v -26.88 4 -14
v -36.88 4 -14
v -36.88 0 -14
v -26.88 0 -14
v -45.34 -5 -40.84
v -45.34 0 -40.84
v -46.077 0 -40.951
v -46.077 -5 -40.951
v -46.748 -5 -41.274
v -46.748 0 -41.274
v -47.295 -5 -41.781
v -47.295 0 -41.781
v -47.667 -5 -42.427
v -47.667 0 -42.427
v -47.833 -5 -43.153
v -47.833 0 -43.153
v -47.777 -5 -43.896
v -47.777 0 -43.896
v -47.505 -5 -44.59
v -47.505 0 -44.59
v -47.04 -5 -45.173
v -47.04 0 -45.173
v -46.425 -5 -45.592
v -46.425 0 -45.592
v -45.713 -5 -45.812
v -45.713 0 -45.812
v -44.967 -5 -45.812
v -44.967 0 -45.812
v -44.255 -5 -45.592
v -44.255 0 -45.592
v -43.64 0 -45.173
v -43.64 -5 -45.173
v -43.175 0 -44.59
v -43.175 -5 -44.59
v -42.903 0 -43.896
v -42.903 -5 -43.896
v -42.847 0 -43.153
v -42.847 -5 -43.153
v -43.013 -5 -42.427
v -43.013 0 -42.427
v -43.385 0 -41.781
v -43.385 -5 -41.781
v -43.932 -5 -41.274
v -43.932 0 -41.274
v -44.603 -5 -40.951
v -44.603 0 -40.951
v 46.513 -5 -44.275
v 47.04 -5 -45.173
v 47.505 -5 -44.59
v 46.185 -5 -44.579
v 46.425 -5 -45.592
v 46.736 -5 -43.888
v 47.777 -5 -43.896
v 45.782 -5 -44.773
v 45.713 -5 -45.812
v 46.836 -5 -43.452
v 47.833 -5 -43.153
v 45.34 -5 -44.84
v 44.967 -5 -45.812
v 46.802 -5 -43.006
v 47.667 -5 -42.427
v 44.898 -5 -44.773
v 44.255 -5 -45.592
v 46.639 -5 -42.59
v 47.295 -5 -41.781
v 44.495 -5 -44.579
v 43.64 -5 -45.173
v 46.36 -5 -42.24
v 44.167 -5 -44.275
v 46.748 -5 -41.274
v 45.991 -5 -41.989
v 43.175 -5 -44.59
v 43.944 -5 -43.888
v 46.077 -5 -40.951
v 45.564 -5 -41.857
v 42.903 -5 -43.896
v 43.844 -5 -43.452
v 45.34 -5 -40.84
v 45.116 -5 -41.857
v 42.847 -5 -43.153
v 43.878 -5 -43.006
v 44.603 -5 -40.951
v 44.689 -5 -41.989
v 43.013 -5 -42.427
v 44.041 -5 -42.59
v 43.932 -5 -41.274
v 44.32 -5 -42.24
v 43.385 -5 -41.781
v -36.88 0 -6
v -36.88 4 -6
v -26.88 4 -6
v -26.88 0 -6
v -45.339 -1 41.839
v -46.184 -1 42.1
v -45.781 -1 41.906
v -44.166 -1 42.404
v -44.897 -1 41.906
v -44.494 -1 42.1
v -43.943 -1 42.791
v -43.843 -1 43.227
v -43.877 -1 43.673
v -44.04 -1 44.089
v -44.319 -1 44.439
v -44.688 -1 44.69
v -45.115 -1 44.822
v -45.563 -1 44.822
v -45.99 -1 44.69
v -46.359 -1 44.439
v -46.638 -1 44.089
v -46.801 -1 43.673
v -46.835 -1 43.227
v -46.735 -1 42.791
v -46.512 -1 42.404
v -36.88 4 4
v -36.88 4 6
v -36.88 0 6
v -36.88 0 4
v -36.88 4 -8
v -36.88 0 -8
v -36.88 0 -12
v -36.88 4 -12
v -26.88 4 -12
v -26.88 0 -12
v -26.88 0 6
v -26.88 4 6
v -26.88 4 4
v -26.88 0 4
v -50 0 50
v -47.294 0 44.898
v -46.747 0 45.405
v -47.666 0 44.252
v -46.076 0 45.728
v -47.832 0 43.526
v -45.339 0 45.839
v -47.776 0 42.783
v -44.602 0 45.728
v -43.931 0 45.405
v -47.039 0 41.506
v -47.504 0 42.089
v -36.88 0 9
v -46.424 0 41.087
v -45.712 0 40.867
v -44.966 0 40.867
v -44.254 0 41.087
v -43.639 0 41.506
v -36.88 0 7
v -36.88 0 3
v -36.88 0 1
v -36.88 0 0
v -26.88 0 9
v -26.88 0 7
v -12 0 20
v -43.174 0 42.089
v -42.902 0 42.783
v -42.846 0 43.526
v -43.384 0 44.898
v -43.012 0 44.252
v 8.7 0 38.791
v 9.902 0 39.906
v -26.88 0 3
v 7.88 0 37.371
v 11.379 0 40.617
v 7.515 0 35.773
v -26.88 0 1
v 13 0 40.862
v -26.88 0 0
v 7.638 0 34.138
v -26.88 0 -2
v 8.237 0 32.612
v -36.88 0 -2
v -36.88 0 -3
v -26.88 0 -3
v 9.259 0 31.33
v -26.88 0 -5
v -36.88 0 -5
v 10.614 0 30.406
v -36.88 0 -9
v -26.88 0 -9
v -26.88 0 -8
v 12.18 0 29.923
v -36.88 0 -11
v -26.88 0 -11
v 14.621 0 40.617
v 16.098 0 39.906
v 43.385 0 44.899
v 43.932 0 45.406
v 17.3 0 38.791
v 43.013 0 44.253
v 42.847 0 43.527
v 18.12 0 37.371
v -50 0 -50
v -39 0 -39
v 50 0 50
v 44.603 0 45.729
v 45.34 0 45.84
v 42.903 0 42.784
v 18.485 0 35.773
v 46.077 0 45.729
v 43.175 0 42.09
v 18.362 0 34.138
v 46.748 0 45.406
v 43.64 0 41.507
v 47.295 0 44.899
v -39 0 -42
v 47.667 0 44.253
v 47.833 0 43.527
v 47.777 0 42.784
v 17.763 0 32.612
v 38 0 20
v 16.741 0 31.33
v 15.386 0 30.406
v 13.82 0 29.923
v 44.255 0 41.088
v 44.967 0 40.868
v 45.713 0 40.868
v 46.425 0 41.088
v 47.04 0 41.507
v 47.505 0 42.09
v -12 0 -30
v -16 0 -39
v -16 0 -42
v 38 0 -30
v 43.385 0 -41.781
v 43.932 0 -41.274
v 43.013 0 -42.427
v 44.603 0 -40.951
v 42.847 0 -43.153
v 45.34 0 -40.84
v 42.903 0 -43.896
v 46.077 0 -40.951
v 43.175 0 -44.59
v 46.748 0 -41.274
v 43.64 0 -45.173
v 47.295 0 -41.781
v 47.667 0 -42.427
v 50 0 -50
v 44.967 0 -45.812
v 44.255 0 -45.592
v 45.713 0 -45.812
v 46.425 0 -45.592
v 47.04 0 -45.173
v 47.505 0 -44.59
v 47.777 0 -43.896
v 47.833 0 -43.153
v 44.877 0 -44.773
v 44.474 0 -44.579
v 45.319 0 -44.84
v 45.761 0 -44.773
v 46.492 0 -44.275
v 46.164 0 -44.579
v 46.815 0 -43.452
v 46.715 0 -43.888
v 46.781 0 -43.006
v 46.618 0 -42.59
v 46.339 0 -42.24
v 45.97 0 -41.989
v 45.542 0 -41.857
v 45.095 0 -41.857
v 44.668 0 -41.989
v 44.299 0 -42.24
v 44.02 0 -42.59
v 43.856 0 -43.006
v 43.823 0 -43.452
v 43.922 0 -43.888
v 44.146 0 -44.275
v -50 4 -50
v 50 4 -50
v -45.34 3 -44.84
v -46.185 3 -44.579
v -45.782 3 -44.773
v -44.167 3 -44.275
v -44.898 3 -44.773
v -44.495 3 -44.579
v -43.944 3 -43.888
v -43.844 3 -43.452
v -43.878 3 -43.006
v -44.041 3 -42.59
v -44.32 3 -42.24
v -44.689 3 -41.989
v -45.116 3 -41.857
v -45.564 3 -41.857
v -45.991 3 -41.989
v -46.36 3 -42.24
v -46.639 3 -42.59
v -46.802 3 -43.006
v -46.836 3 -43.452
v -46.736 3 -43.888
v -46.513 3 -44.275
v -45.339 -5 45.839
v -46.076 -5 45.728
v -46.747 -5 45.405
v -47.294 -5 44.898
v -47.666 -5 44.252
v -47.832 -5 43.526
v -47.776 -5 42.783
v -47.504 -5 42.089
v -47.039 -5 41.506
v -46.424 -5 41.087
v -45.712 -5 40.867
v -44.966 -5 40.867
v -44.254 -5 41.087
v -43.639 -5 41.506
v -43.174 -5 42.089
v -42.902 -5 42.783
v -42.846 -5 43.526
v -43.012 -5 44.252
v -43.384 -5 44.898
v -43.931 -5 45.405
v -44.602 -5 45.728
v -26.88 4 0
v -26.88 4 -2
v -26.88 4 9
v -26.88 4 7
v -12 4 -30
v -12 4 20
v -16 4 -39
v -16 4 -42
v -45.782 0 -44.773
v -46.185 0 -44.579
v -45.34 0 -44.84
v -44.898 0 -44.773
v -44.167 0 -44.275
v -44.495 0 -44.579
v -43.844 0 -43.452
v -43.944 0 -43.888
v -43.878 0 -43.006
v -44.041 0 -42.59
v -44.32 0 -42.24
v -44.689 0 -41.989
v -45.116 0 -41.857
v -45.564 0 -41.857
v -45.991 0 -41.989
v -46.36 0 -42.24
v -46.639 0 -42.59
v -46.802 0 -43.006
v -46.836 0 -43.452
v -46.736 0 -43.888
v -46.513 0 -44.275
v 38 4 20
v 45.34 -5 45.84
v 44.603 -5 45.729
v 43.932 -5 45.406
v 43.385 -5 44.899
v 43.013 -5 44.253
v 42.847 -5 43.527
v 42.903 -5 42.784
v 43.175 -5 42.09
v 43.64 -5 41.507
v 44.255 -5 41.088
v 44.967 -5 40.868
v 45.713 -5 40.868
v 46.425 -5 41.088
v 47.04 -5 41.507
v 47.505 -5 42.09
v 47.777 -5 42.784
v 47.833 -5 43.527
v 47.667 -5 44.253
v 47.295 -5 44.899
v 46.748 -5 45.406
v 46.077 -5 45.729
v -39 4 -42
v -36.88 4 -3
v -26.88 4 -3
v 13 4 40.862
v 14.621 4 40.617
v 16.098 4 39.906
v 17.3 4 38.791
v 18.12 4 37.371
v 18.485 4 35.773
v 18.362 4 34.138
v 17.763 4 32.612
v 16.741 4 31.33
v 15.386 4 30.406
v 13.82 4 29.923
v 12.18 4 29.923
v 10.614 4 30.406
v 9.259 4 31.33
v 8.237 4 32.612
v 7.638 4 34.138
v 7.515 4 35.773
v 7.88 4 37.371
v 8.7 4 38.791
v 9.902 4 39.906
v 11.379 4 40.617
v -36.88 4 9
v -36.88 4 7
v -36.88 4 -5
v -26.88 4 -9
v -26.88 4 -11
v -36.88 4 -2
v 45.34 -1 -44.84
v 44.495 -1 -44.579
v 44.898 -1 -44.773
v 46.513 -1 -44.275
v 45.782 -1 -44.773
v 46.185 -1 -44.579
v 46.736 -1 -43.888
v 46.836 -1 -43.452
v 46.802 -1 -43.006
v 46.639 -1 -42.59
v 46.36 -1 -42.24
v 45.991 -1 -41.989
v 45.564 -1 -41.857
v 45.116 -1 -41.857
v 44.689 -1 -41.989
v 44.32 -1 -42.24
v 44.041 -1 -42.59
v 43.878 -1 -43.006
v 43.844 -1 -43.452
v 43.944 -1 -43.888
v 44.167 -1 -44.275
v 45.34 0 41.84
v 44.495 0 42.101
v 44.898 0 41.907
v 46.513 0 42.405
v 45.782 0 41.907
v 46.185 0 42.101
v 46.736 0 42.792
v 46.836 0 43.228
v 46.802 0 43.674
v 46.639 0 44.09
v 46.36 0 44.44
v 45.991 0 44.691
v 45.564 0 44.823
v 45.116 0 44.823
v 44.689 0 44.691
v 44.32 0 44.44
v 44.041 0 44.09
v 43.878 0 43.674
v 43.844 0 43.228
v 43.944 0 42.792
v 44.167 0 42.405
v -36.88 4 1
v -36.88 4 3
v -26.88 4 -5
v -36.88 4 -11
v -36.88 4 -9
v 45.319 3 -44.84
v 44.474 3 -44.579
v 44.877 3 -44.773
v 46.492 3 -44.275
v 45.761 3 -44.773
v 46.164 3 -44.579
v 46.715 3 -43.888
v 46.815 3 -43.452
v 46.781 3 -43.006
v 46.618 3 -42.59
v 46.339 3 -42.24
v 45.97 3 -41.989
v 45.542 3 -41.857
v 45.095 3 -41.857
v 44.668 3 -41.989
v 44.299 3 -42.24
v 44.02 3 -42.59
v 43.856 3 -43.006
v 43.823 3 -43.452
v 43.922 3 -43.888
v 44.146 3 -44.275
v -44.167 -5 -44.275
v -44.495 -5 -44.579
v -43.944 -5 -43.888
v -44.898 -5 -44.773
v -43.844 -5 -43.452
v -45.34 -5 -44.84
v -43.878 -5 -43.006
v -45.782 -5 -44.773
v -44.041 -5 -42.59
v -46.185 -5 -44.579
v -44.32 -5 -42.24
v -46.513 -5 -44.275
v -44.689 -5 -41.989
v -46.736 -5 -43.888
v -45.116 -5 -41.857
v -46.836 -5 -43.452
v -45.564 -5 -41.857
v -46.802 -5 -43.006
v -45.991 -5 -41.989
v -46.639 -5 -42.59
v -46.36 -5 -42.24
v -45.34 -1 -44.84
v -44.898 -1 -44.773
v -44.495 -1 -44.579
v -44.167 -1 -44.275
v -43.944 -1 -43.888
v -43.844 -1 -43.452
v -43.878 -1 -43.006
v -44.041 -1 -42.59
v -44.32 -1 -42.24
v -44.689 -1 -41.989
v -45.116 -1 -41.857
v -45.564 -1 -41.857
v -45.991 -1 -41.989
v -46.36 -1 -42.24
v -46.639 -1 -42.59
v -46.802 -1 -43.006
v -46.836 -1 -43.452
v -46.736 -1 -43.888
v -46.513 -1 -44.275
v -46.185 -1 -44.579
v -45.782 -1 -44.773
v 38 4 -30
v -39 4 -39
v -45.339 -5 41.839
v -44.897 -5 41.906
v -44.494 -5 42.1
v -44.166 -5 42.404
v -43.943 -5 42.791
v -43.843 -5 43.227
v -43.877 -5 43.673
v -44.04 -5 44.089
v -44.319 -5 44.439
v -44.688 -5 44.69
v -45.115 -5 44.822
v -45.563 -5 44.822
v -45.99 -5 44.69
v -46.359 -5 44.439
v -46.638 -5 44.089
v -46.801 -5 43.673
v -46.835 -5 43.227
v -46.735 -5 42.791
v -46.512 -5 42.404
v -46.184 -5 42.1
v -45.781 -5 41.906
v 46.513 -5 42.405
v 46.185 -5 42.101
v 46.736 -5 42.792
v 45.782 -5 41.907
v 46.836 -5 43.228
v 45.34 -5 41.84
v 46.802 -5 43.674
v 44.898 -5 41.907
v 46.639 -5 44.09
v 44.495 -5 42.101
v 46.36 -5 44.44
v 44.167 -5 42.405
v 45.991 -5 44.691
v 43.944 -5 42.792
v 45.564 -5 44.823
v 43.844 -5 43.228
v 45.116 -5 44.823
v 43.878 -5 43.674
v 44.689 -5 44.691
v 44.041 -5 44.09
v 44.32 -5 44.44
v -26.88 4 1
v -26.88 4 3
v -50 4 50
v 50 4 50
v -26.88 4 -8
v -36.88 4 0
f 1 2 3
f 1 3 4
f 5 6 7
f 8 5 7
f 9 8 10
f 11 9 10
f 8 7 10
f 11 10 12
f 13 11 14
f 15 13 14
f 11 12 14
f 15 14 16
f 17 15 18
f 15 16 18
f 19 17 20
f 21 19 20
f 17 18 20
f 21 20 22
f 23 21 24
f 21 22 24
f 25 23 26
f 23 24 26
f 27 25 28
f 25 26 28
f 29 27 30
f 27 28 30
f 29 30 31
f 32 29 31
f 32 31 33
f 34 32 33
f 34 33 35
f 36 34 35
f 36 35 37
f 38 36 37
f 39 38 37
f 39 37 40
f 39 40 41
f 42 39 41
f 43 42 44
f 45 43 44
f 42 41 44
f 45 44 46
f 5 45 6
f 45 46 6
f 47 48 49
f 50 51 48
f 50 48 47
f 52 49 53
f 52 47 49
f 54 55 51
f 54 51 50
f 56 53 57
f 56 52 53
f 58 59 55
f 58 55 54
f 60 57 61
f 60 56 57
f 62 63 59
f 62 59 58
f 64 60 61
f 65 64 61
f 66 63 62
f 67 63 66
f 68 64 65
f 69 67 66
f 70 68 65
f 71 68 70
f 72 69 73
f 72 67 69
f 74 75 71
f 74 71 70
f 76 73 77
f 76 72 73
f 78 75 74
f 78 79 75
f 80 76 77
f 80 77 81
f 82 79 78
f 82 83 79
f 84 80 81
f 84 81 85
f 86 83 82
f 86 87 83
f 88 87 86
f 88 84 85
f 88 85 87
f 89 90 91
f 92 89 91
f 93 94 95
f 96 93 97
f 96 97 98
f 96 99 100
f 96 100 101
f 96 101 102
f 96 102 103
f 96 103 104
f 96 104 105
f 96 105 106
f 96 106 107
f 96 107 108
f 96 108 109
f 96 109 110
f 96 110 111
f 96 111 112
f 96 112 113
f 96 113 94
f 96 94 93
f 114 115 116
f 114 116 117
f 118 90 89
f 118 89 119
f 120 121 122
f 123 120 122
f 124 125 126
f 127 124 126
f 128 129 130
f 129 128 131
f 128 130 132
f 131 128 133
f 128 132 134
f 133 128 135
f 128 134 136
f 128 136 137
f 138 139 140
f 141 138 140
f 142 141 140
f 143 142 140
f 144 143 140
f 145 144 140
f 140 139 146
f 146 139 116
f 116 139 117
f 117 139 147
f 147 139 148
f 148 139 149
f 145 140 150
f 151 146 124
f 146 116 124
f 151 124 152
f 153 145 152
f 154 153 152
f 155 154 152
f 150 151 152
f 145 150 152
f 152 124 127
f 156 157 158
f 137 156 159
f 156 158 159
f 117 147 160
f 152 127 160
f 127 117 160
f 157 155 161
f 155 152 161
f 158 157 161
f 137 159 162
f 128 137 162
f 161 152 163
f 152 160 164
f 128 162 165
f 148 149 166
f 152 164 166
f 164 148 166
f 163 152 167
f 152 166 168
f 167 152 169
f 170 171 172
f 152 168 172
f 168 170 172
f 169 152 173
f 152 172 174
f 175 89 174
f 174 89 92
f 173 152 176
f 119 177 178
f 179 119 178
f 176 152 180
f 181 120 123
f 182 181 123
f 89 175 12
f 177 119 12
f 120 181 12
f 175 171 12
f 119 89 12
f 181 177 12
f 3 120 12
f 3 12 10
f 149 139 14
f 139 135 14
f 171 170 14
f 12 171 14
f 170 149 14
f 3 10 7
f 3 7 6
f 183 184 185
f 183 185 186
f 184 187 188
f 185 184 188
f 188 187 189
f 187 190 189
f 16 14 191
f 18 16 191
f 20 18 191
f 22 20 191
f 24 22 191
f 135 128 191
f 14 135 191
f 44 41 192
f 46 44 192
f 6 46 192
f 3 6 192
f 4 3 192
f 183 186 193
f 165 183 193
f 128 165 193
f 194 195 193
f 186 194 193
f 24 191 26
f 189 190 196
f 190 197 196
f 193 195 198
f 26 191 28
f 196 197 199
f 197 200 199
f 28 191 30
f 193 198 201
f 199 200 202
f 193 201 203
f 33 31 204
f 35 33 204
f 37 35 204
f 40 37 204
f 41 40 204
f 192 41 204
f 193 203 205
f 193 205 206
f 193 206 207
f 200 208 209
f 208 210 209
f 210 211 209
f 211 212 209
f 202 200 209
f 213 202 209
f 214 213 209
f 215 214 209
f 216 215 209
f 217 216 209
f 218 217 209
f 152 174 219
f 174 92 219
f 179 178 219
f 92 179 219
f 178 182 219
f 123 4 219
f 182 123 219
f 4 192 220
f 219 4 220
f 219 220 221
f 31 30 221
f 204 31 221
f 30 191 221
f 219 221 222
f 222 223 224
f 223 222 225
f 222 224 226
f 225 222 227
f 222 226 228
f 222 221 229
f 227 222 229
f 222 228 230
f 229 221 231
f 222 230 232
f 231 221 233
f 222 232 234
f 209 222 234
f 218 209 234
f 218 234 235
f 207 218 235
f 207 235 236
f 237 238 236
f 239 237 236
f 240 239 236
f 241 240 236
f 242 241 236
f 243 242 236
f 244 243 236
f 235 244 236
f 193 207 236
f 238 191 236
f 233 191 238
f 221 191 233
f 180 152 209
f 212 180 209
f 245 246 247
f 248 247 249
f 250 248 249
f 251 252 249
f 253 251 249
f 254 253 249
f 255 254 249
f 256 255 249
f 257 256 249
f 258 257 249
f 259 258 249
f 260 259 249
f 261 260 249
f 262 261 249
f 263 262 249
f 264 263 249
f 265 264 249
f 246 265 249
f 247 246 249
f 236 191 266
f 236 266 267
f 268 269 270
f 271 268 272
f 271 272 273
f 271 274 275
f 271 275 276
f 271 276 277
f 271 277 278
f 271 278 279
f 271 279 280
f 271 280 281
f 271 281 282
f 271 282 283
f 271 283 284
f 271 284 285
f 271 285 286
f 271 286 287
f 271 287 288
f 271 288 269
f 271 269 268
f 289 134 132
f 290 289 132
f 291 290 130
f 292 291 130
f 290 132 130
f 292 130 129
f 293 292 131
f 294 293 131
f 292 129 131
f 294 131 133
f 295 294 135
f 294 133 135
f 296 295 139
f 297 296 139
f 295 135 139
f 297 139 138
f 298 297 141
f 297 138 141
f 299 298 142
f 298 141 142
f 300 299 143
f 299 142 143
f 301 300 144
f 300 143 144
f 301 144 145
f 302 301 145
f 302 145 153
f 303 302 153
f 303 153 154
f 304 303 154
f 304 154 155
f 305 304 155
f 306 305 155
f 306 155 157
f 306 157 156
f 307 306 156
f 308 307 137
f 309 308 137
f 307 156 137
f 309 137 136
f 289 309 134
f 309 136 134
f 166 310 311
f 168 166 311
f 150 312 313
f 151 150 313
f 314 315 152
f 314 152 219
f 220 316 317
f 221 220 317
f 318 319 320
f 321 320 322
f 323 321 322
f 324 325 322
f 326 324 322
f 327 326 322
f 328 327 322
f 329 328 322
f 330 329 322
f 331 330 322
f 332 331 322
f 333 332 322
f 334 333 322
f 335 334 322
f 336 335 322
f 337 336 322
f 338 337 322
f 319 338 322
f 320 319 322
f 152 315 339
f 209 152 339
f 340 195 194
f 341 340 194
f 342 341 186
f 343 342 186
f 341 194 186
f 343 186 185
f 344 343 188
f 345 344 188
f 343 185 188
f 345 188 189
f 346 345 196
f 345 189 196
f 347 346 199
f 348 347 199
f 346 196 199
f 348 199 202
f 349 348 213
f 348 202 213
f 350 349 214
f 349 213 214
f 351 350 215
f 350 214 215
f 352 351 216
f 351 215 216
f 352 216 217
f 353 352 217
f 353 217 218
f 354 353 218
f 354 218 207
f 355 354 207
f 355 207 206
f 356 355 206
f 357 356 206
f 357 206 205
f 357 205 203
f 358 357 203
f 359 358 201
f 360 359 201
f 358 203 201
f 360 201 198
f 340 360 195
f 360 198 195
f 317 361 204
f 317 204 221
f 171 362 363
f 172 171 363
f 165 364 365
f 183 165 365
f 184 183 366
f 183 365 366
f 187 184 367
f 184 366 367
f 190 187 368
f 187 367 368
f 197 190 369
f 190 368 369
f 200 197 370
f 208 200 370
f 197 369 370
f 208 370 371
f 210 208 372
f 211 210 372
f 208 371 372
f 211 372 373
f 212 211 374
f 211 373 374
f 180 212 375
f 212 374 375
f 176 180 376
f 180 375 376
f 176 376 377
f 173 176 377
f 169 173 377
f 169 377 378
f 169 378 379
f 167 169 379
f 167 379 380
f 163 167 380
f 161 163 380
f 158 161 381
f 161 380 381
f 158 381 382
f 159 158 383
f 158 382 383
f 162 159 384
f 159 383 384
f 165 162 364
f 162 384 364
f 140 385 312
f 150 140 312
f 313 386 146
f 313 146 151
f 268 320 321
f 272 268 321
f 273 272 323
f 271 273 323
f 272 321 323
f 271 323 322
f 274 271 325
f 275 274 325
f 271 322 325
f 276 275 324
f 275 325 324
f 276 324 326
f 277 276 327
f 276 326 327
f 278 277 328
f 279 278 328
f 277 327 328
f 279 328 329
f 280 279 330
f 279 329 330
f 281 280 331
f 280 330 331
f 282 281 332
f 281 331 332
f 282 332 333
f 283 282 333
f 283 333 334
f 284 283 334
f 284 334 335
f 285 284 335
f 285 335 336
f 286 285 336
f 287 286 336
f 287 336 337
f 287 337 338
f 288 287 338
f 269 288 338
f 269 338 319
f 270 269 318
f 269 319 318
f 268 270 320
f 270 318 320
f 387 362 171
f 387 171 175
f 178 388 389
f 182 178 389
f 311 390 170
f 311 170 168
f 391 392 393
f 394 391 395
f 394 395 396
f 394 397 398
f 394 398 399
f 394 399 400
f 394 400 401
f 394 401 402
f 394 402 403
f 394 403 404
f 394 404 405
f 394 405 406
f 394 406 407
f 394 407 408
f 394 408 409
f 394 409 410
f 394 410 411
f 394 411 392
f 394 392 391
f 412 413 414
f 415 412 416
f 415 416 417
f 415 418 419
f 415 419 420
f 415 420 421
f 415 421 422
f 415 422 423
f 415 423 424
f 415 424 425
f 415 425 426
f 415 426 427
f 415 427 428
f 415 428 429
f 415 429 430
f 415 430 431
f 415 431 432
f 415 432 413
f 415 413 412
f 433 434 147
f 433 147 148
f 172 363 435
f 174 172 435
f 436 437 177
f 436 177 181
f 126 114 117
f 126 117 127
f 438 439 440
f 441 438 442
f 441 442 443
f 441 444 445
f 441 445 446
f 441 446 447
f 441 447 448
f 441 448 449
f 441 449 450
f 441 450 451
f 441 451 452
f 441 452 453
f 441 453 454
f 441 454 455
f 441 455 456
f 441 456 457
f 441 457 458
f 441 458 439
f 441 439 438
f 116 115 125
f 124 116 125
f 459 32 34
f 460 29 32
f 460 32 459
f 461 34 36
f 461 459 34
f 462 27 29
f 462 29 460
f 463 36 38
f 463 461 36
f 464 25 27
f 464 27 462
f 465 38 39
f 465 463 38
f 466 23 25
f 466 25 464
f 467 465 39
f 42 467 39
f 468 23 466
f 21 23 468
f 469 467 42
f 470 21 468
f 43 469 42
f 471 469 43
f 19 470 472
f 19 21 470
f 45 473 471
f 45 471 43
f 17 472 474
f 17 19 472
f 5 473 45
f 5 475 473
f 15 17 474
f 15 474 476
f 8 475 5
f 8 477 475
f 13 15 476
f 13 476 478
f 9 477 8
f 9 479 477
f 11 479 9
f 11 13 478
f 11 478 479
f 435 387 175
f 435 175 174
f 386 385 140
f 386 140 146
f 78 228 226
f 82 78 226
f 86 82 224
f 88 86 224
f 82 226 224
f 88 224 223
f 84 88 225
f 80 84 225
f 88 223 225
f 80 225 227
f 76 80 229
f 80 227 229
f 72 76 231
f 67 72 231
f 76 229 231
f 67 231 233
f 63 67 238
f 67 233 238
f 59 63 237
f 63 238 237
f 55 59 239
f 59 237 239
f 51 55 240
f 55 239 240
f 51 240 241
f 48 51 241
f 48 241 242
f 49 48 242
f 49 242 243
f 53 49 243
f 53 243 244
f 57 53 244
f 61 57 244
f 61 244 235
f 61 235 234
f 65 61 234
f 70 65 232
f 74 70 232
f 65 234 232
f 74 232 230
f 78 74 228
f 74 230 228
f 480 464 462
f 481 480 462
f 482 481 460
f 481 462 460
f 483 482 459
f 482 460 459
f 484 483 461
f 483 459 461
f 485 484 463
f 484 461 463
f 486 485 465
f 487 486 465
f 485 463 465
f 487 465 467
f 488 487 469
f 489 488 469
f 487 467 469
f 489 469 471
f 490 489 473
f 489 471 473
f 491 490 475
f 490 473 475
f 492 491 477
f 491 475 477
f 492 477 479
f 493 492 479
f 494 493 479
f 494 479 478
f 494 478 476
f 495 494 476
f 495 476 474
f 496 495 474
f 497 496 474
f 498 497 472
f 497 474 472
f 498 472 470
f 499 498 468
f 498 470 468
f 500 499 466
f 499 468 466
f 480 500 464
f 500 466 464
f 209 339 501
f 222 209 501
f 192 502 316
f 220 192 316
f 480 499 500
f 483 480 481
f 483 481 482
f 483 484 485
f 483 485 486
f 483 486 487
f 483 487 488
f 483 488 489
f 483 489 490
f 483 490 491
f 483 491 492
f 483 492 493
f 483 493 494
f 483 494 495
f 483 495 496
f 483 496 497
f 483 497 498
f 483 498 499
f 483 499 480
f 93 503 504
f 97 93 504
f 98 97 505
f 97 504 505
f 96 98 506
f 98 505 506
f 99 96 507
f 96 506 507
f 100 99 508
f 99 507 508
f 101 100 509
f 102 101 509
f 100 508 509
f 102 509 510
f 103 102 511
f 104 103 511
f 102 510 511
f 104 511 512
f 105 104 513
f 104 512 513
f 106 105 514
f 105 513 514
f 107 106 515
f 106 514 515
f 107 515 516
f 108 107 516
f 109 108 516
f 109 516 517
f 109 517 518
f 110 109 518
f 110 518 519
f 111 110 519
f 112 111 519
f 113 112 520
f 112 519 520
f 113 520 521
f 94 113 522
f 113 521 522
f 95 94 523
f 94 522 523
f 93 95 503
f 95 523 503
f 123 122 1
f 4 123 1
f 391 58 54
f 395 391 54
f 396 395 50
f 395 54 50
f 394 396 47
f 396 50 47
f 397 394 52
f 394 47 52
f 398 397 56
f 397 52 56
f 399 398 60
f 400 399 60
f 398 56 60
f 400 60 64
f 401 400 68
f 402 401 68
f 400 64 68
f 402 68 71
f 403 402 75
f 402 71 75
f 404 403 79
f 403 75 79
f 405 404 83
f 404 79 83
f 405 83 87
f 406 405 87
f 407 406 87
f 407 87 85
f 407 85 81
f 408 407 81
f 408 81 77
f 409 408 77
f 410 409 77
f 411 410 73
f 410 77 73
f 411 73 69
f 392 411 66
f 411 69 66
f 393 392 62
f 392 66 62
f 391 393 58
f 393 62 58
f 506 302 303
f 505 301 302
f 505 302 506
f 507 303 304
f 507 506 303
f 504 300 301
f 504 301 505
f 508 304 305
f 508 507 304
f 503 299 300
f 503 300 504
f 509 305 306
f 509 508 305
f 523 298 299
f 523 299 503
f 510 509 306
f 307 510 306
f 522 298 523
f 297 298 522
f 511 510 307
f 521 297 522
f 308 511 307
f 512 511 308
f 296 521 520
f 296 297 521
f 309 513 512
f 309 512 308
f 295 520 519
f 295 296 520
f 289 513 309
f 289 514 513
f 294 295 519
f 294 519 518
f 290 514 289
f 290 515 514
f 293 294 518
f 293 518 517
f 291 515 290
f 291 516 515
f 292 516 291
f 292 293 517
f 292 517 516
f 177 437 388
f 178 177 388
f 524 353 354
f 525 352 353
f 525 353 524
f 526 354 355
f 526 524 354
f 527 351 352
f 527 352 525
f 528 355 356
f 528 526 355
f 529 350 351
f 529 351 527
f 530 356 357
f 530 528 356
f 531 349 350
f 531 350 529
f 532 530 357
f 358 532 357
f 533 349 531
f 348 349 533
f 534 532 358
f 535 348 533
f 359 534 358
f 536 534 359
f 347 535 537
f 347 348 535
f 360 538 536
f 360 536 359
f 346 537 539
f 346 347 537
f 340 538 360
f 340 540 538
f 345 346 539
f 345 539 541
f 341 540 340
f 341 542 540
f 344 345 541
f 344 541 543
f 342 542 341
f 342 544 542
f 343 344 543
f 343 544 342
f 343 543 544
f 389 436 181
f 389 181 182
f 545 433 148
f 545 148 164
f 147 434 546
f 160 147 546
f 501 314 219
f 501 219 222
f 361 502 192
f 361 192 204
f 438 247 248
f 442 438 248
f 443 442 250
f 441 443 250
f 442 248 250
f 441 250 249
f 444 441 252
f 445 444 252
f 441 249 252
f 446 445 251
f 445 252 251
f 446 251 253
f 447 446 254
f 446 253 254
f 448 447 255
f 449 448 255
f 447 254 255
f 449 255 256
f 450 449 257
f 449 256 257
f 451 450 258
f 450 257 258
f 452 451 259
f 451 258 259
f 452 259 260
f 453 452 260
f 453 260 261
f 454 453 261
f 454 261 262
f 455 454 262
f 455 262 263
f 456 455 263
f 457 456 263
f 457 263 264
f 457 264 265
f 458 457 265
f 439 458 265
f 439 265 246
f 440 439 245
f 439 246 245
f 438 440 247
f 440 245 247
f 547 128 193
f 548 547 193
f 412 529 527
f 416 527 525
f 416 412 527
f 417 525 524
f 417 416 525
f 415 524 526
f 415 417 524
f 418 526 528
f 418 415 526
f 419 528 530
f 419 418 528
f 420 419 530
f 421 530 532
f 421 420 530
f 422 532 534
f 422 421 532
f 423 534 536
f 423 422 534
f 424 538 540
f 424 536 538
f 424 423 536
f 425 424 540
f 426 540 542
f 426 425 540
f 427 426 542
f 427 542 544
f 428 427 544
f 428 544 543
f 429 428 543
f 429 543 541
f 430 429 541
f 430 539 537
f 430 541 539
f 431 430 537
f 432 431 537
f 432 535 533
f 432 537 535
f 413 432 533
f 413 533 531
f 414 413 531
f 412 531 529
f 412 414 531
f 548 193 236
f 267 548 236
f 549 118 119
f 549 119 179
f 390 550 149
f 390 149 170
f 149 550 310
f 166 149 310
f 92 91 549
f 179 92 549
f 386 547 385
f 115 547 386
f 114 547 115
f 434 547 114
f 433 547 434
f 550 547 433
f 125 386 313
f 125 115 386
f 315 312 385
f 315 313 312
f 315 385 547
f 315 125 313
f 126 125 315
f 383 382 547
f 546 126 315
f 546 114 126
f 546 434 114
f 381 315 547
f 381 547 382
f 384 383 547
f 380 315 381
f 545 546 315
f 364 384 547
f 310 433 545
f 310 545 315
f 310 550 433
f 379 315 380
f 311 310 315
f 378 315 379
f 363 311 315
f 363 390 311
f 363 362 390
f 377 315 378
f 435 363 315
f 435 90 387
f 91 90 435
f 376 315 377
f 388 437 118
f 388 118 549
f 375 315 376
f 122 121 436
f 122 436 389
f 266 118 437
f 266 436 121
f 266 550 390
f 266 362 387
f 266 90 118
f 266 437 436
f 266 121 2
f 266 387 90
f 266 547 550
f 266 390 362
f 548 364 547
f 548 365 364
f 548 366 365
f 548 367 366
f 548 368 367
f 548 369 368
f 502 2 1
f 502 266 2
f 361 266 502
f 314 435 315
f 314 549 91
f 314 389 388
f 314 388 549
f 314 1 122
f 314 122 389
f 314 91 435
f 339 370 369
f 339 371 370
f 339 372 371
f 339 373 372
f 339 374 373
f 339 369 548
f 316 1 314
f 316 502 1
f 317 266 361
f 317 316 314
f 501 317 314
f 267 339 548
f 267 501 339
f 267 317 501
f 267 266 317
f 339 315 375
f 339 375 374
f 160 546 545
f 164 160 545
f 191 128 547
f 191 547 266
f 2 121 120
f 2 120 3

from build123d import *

# Parameters (mm, degrees)
SKETCH2_W           = 100
SKETCH2_H           = 100
BOSS_EXTRUDE1_DEPTH = 4
SKETCH3_W           = 50
SKETCH3_H           = 50
CUT_EXTRUDE1_DEPTH  = 4
SKETCH4_W           = 23
SKETCH4_H           = 3
CUT_EXTRUDE2_DEPTH  = 4
SKETCH5_W           = 10
SKETCH5_H           = 2
CUT_EXTRUDE3_DEPTH  = 4
LPATTERN1_COUNT     = 8
LPATTERN1_PITCH     = 3
SKETCH6_R           = 5.5
CUT_EXTRUDE4_DEPTH  = 4
SKETCH8_R           = 2.5
BOSS_EXTRUDE3_DEPTH = 5
SKETCH10_R          = 1.5
CUT_EXTRUDE5_DEPTH  = 3
SKETCH11_R          = 1.5
CUT_EXTRUDE7_DEPTH  = 7
SKETCH12_R          = 1.5
CUT_EXTRUDE8_DEPTH  = 4
SKETCH13_R          = 1.5
CUT_EXTRUDE9_DEPTH  = 4
SKETCH14_R          = 1.5
CUT_EXTRUDE10_DEPTH = 4


with BuildPart() as part:
    # Sketch2 → Boss-Extrude1 (new body)
    with BuildSketch(Plane(origin=(0, 0, 0), x_dir=(1, 0, 0), z_dir=(0, 1, 0))):
        Rectangle(SKETCH2_W, SKETCH2_H)
    extrude(amount=BOSS_EXTRUDE1_DEPTH)

    # Sketch3 → Cut-Extrude1 (cut)
    with BuildSketch(Plane(origin=(0, 4, 0), x_dir=(1, 0, 0), z_dir=(0, 1, 0))):
        with Locations((13, 5)):
            Rectangle(SKETCH3_W, SKETCH3_H)
    extrude(amount=-CUT_EXTRUDE1_DEPTH, mode=Mode.SUBTRACT)

    # Sketch4 → Cut-Extrude2 (cut)
    with BuildSketch(Plane(origin=(0, 4, 0), x_dir=(1, 0, 0), z_dir=(0, 1, 0))):
        with Locations((-27.5, 40.5)):
            Rectangle(SKETCH4_W, SKETCH4_H)
    extrude(amount=-CUT_EXTRUDE2_DEPTH, mode=Mode.SUBTRACT)

    # Sketch5 → Cut-Extrude3 (cut)
    with BuildSketch(Plane(origin=(0, 4, 0), x_dir=(1, 0, 0), z_dir=(0, 1, 0))):
        with Locations((-31.87977559, 13)):
            Rectangle(SKETCH5_W, SKETCH5_H)
    cut_extrude3 = extrude(amount=-CUT_EXTRUDE3_DEPTH, mode=Mode.SUBTRACT)

    # LPattern1: Cut-Extrude3 ×8
    with Locations(*[(0, 0, i * LPATTERN1_PITCH) for i in range(1, LPATTERN1_COUNT)]):
        add(cut_extrude3, mode=Mode.SUBTRACT)

    # Sketch6 → Cut-Extrude4 (cut)
    with BuildSketch(Plane(origin=(0, 4, 0), x_dir=(1, 0, 0), z_dir=(0, 1, 0))):
        with Locations(Location((13, -35.361632217, 0), (0, 0, 270))):
            Circle(SKETCH6_R)
    extrude(amount=-CUT_EXTRUDE4_DEPTH, mode=Mode.SUBTRACT)

    # Sketch8 → Boss-Extrude3 (add)
    with BuildSketch(Plane(origin=(0, 0, 0), x_dir=(-1, 0, 0), z_dir=(0, -1, 0))):
        with Locations(Location((45.34, 43.34, 0), (0, 0, 270))):
            Circle(SKETCH8_R)
        with Locations(Location((-45.34, 43.34, 0), (0, 0, 270))):
            Circle(SKETCH8_R)
        with Locations(Location((-45.34, -43.34, 0), (0, 0, 270))):
            Circle(SKETCH8_R)
        with Locations(Location((45.339, -43.339, 0), (0, 0, 270))):
            Circle(SKETCH8_R)
    extrude(amount=BOSS_EXTRUDE3_DEPTH)

    # Sketch10 → Cut-Extrude5 (cut)
    with BuildSketch(Plane.XZ):
        with Locations(Location((-45.34, -43.34, 0), (0, 0, 270))):
            Circle(SKETCH10_R)
        with Locations(Location((45.318764469, -43.34, 0), (0, 0, 270))):
            Circle(SKETCH10_R)
    extrude(amount=-CUT_EXTRUDE5_DEPTH, mode=Mode.SUBTRACT)

    # Sketch11 → Cut-Extrude7 (cut)
    with BuildSketch(Plane.XZ):
        with Locations(Location((45.34, 43.34, 0), (0, 0, 270))):
            Circle(SKETCH11_R)
    extrude(amount=CUT_EXTRUDE7_DEPTH, mode=Mode.SUBTRACT)

    # Sketch12 → Cut-Extrude8 (cut)
    with BuildSketch(Plane.XZ.offset(5)):
        with Locations(Location((45.34, -43.34, 0), (0, 0, 270))):
            Circle(SKETCH12_R)
    extrude(amount=-CUT_EXTRUDE8_DEPTH, mode=Mode.SUBTRACT)

    # Sketch13 → Cut-Extrude9 (cut)
    with BuildSketch(Plane.XZ.offset(5)):
        with Locations(Location((-45.34, -43.34, 0), (0, 0, 270))):
            Circle(SKETCH13_R)
    extrude(amount=-CUT_EXTRUDE9_DEPTH, mode=Mode.SUBTRACT)

    # Sketch14 → Cut-Extrude10 (cut)
    with BuildSketch(Plane.XZ.offset(5)):
        with Locations(Location((-45.339, 43.339, 0), (0, 0, 270))):
            Circle(SKETCH14_R)
    extrude(amount=-CUT_EXTRUDE10_DEPTH, mode=Mode.SUBTRACT)


solid = part.part
